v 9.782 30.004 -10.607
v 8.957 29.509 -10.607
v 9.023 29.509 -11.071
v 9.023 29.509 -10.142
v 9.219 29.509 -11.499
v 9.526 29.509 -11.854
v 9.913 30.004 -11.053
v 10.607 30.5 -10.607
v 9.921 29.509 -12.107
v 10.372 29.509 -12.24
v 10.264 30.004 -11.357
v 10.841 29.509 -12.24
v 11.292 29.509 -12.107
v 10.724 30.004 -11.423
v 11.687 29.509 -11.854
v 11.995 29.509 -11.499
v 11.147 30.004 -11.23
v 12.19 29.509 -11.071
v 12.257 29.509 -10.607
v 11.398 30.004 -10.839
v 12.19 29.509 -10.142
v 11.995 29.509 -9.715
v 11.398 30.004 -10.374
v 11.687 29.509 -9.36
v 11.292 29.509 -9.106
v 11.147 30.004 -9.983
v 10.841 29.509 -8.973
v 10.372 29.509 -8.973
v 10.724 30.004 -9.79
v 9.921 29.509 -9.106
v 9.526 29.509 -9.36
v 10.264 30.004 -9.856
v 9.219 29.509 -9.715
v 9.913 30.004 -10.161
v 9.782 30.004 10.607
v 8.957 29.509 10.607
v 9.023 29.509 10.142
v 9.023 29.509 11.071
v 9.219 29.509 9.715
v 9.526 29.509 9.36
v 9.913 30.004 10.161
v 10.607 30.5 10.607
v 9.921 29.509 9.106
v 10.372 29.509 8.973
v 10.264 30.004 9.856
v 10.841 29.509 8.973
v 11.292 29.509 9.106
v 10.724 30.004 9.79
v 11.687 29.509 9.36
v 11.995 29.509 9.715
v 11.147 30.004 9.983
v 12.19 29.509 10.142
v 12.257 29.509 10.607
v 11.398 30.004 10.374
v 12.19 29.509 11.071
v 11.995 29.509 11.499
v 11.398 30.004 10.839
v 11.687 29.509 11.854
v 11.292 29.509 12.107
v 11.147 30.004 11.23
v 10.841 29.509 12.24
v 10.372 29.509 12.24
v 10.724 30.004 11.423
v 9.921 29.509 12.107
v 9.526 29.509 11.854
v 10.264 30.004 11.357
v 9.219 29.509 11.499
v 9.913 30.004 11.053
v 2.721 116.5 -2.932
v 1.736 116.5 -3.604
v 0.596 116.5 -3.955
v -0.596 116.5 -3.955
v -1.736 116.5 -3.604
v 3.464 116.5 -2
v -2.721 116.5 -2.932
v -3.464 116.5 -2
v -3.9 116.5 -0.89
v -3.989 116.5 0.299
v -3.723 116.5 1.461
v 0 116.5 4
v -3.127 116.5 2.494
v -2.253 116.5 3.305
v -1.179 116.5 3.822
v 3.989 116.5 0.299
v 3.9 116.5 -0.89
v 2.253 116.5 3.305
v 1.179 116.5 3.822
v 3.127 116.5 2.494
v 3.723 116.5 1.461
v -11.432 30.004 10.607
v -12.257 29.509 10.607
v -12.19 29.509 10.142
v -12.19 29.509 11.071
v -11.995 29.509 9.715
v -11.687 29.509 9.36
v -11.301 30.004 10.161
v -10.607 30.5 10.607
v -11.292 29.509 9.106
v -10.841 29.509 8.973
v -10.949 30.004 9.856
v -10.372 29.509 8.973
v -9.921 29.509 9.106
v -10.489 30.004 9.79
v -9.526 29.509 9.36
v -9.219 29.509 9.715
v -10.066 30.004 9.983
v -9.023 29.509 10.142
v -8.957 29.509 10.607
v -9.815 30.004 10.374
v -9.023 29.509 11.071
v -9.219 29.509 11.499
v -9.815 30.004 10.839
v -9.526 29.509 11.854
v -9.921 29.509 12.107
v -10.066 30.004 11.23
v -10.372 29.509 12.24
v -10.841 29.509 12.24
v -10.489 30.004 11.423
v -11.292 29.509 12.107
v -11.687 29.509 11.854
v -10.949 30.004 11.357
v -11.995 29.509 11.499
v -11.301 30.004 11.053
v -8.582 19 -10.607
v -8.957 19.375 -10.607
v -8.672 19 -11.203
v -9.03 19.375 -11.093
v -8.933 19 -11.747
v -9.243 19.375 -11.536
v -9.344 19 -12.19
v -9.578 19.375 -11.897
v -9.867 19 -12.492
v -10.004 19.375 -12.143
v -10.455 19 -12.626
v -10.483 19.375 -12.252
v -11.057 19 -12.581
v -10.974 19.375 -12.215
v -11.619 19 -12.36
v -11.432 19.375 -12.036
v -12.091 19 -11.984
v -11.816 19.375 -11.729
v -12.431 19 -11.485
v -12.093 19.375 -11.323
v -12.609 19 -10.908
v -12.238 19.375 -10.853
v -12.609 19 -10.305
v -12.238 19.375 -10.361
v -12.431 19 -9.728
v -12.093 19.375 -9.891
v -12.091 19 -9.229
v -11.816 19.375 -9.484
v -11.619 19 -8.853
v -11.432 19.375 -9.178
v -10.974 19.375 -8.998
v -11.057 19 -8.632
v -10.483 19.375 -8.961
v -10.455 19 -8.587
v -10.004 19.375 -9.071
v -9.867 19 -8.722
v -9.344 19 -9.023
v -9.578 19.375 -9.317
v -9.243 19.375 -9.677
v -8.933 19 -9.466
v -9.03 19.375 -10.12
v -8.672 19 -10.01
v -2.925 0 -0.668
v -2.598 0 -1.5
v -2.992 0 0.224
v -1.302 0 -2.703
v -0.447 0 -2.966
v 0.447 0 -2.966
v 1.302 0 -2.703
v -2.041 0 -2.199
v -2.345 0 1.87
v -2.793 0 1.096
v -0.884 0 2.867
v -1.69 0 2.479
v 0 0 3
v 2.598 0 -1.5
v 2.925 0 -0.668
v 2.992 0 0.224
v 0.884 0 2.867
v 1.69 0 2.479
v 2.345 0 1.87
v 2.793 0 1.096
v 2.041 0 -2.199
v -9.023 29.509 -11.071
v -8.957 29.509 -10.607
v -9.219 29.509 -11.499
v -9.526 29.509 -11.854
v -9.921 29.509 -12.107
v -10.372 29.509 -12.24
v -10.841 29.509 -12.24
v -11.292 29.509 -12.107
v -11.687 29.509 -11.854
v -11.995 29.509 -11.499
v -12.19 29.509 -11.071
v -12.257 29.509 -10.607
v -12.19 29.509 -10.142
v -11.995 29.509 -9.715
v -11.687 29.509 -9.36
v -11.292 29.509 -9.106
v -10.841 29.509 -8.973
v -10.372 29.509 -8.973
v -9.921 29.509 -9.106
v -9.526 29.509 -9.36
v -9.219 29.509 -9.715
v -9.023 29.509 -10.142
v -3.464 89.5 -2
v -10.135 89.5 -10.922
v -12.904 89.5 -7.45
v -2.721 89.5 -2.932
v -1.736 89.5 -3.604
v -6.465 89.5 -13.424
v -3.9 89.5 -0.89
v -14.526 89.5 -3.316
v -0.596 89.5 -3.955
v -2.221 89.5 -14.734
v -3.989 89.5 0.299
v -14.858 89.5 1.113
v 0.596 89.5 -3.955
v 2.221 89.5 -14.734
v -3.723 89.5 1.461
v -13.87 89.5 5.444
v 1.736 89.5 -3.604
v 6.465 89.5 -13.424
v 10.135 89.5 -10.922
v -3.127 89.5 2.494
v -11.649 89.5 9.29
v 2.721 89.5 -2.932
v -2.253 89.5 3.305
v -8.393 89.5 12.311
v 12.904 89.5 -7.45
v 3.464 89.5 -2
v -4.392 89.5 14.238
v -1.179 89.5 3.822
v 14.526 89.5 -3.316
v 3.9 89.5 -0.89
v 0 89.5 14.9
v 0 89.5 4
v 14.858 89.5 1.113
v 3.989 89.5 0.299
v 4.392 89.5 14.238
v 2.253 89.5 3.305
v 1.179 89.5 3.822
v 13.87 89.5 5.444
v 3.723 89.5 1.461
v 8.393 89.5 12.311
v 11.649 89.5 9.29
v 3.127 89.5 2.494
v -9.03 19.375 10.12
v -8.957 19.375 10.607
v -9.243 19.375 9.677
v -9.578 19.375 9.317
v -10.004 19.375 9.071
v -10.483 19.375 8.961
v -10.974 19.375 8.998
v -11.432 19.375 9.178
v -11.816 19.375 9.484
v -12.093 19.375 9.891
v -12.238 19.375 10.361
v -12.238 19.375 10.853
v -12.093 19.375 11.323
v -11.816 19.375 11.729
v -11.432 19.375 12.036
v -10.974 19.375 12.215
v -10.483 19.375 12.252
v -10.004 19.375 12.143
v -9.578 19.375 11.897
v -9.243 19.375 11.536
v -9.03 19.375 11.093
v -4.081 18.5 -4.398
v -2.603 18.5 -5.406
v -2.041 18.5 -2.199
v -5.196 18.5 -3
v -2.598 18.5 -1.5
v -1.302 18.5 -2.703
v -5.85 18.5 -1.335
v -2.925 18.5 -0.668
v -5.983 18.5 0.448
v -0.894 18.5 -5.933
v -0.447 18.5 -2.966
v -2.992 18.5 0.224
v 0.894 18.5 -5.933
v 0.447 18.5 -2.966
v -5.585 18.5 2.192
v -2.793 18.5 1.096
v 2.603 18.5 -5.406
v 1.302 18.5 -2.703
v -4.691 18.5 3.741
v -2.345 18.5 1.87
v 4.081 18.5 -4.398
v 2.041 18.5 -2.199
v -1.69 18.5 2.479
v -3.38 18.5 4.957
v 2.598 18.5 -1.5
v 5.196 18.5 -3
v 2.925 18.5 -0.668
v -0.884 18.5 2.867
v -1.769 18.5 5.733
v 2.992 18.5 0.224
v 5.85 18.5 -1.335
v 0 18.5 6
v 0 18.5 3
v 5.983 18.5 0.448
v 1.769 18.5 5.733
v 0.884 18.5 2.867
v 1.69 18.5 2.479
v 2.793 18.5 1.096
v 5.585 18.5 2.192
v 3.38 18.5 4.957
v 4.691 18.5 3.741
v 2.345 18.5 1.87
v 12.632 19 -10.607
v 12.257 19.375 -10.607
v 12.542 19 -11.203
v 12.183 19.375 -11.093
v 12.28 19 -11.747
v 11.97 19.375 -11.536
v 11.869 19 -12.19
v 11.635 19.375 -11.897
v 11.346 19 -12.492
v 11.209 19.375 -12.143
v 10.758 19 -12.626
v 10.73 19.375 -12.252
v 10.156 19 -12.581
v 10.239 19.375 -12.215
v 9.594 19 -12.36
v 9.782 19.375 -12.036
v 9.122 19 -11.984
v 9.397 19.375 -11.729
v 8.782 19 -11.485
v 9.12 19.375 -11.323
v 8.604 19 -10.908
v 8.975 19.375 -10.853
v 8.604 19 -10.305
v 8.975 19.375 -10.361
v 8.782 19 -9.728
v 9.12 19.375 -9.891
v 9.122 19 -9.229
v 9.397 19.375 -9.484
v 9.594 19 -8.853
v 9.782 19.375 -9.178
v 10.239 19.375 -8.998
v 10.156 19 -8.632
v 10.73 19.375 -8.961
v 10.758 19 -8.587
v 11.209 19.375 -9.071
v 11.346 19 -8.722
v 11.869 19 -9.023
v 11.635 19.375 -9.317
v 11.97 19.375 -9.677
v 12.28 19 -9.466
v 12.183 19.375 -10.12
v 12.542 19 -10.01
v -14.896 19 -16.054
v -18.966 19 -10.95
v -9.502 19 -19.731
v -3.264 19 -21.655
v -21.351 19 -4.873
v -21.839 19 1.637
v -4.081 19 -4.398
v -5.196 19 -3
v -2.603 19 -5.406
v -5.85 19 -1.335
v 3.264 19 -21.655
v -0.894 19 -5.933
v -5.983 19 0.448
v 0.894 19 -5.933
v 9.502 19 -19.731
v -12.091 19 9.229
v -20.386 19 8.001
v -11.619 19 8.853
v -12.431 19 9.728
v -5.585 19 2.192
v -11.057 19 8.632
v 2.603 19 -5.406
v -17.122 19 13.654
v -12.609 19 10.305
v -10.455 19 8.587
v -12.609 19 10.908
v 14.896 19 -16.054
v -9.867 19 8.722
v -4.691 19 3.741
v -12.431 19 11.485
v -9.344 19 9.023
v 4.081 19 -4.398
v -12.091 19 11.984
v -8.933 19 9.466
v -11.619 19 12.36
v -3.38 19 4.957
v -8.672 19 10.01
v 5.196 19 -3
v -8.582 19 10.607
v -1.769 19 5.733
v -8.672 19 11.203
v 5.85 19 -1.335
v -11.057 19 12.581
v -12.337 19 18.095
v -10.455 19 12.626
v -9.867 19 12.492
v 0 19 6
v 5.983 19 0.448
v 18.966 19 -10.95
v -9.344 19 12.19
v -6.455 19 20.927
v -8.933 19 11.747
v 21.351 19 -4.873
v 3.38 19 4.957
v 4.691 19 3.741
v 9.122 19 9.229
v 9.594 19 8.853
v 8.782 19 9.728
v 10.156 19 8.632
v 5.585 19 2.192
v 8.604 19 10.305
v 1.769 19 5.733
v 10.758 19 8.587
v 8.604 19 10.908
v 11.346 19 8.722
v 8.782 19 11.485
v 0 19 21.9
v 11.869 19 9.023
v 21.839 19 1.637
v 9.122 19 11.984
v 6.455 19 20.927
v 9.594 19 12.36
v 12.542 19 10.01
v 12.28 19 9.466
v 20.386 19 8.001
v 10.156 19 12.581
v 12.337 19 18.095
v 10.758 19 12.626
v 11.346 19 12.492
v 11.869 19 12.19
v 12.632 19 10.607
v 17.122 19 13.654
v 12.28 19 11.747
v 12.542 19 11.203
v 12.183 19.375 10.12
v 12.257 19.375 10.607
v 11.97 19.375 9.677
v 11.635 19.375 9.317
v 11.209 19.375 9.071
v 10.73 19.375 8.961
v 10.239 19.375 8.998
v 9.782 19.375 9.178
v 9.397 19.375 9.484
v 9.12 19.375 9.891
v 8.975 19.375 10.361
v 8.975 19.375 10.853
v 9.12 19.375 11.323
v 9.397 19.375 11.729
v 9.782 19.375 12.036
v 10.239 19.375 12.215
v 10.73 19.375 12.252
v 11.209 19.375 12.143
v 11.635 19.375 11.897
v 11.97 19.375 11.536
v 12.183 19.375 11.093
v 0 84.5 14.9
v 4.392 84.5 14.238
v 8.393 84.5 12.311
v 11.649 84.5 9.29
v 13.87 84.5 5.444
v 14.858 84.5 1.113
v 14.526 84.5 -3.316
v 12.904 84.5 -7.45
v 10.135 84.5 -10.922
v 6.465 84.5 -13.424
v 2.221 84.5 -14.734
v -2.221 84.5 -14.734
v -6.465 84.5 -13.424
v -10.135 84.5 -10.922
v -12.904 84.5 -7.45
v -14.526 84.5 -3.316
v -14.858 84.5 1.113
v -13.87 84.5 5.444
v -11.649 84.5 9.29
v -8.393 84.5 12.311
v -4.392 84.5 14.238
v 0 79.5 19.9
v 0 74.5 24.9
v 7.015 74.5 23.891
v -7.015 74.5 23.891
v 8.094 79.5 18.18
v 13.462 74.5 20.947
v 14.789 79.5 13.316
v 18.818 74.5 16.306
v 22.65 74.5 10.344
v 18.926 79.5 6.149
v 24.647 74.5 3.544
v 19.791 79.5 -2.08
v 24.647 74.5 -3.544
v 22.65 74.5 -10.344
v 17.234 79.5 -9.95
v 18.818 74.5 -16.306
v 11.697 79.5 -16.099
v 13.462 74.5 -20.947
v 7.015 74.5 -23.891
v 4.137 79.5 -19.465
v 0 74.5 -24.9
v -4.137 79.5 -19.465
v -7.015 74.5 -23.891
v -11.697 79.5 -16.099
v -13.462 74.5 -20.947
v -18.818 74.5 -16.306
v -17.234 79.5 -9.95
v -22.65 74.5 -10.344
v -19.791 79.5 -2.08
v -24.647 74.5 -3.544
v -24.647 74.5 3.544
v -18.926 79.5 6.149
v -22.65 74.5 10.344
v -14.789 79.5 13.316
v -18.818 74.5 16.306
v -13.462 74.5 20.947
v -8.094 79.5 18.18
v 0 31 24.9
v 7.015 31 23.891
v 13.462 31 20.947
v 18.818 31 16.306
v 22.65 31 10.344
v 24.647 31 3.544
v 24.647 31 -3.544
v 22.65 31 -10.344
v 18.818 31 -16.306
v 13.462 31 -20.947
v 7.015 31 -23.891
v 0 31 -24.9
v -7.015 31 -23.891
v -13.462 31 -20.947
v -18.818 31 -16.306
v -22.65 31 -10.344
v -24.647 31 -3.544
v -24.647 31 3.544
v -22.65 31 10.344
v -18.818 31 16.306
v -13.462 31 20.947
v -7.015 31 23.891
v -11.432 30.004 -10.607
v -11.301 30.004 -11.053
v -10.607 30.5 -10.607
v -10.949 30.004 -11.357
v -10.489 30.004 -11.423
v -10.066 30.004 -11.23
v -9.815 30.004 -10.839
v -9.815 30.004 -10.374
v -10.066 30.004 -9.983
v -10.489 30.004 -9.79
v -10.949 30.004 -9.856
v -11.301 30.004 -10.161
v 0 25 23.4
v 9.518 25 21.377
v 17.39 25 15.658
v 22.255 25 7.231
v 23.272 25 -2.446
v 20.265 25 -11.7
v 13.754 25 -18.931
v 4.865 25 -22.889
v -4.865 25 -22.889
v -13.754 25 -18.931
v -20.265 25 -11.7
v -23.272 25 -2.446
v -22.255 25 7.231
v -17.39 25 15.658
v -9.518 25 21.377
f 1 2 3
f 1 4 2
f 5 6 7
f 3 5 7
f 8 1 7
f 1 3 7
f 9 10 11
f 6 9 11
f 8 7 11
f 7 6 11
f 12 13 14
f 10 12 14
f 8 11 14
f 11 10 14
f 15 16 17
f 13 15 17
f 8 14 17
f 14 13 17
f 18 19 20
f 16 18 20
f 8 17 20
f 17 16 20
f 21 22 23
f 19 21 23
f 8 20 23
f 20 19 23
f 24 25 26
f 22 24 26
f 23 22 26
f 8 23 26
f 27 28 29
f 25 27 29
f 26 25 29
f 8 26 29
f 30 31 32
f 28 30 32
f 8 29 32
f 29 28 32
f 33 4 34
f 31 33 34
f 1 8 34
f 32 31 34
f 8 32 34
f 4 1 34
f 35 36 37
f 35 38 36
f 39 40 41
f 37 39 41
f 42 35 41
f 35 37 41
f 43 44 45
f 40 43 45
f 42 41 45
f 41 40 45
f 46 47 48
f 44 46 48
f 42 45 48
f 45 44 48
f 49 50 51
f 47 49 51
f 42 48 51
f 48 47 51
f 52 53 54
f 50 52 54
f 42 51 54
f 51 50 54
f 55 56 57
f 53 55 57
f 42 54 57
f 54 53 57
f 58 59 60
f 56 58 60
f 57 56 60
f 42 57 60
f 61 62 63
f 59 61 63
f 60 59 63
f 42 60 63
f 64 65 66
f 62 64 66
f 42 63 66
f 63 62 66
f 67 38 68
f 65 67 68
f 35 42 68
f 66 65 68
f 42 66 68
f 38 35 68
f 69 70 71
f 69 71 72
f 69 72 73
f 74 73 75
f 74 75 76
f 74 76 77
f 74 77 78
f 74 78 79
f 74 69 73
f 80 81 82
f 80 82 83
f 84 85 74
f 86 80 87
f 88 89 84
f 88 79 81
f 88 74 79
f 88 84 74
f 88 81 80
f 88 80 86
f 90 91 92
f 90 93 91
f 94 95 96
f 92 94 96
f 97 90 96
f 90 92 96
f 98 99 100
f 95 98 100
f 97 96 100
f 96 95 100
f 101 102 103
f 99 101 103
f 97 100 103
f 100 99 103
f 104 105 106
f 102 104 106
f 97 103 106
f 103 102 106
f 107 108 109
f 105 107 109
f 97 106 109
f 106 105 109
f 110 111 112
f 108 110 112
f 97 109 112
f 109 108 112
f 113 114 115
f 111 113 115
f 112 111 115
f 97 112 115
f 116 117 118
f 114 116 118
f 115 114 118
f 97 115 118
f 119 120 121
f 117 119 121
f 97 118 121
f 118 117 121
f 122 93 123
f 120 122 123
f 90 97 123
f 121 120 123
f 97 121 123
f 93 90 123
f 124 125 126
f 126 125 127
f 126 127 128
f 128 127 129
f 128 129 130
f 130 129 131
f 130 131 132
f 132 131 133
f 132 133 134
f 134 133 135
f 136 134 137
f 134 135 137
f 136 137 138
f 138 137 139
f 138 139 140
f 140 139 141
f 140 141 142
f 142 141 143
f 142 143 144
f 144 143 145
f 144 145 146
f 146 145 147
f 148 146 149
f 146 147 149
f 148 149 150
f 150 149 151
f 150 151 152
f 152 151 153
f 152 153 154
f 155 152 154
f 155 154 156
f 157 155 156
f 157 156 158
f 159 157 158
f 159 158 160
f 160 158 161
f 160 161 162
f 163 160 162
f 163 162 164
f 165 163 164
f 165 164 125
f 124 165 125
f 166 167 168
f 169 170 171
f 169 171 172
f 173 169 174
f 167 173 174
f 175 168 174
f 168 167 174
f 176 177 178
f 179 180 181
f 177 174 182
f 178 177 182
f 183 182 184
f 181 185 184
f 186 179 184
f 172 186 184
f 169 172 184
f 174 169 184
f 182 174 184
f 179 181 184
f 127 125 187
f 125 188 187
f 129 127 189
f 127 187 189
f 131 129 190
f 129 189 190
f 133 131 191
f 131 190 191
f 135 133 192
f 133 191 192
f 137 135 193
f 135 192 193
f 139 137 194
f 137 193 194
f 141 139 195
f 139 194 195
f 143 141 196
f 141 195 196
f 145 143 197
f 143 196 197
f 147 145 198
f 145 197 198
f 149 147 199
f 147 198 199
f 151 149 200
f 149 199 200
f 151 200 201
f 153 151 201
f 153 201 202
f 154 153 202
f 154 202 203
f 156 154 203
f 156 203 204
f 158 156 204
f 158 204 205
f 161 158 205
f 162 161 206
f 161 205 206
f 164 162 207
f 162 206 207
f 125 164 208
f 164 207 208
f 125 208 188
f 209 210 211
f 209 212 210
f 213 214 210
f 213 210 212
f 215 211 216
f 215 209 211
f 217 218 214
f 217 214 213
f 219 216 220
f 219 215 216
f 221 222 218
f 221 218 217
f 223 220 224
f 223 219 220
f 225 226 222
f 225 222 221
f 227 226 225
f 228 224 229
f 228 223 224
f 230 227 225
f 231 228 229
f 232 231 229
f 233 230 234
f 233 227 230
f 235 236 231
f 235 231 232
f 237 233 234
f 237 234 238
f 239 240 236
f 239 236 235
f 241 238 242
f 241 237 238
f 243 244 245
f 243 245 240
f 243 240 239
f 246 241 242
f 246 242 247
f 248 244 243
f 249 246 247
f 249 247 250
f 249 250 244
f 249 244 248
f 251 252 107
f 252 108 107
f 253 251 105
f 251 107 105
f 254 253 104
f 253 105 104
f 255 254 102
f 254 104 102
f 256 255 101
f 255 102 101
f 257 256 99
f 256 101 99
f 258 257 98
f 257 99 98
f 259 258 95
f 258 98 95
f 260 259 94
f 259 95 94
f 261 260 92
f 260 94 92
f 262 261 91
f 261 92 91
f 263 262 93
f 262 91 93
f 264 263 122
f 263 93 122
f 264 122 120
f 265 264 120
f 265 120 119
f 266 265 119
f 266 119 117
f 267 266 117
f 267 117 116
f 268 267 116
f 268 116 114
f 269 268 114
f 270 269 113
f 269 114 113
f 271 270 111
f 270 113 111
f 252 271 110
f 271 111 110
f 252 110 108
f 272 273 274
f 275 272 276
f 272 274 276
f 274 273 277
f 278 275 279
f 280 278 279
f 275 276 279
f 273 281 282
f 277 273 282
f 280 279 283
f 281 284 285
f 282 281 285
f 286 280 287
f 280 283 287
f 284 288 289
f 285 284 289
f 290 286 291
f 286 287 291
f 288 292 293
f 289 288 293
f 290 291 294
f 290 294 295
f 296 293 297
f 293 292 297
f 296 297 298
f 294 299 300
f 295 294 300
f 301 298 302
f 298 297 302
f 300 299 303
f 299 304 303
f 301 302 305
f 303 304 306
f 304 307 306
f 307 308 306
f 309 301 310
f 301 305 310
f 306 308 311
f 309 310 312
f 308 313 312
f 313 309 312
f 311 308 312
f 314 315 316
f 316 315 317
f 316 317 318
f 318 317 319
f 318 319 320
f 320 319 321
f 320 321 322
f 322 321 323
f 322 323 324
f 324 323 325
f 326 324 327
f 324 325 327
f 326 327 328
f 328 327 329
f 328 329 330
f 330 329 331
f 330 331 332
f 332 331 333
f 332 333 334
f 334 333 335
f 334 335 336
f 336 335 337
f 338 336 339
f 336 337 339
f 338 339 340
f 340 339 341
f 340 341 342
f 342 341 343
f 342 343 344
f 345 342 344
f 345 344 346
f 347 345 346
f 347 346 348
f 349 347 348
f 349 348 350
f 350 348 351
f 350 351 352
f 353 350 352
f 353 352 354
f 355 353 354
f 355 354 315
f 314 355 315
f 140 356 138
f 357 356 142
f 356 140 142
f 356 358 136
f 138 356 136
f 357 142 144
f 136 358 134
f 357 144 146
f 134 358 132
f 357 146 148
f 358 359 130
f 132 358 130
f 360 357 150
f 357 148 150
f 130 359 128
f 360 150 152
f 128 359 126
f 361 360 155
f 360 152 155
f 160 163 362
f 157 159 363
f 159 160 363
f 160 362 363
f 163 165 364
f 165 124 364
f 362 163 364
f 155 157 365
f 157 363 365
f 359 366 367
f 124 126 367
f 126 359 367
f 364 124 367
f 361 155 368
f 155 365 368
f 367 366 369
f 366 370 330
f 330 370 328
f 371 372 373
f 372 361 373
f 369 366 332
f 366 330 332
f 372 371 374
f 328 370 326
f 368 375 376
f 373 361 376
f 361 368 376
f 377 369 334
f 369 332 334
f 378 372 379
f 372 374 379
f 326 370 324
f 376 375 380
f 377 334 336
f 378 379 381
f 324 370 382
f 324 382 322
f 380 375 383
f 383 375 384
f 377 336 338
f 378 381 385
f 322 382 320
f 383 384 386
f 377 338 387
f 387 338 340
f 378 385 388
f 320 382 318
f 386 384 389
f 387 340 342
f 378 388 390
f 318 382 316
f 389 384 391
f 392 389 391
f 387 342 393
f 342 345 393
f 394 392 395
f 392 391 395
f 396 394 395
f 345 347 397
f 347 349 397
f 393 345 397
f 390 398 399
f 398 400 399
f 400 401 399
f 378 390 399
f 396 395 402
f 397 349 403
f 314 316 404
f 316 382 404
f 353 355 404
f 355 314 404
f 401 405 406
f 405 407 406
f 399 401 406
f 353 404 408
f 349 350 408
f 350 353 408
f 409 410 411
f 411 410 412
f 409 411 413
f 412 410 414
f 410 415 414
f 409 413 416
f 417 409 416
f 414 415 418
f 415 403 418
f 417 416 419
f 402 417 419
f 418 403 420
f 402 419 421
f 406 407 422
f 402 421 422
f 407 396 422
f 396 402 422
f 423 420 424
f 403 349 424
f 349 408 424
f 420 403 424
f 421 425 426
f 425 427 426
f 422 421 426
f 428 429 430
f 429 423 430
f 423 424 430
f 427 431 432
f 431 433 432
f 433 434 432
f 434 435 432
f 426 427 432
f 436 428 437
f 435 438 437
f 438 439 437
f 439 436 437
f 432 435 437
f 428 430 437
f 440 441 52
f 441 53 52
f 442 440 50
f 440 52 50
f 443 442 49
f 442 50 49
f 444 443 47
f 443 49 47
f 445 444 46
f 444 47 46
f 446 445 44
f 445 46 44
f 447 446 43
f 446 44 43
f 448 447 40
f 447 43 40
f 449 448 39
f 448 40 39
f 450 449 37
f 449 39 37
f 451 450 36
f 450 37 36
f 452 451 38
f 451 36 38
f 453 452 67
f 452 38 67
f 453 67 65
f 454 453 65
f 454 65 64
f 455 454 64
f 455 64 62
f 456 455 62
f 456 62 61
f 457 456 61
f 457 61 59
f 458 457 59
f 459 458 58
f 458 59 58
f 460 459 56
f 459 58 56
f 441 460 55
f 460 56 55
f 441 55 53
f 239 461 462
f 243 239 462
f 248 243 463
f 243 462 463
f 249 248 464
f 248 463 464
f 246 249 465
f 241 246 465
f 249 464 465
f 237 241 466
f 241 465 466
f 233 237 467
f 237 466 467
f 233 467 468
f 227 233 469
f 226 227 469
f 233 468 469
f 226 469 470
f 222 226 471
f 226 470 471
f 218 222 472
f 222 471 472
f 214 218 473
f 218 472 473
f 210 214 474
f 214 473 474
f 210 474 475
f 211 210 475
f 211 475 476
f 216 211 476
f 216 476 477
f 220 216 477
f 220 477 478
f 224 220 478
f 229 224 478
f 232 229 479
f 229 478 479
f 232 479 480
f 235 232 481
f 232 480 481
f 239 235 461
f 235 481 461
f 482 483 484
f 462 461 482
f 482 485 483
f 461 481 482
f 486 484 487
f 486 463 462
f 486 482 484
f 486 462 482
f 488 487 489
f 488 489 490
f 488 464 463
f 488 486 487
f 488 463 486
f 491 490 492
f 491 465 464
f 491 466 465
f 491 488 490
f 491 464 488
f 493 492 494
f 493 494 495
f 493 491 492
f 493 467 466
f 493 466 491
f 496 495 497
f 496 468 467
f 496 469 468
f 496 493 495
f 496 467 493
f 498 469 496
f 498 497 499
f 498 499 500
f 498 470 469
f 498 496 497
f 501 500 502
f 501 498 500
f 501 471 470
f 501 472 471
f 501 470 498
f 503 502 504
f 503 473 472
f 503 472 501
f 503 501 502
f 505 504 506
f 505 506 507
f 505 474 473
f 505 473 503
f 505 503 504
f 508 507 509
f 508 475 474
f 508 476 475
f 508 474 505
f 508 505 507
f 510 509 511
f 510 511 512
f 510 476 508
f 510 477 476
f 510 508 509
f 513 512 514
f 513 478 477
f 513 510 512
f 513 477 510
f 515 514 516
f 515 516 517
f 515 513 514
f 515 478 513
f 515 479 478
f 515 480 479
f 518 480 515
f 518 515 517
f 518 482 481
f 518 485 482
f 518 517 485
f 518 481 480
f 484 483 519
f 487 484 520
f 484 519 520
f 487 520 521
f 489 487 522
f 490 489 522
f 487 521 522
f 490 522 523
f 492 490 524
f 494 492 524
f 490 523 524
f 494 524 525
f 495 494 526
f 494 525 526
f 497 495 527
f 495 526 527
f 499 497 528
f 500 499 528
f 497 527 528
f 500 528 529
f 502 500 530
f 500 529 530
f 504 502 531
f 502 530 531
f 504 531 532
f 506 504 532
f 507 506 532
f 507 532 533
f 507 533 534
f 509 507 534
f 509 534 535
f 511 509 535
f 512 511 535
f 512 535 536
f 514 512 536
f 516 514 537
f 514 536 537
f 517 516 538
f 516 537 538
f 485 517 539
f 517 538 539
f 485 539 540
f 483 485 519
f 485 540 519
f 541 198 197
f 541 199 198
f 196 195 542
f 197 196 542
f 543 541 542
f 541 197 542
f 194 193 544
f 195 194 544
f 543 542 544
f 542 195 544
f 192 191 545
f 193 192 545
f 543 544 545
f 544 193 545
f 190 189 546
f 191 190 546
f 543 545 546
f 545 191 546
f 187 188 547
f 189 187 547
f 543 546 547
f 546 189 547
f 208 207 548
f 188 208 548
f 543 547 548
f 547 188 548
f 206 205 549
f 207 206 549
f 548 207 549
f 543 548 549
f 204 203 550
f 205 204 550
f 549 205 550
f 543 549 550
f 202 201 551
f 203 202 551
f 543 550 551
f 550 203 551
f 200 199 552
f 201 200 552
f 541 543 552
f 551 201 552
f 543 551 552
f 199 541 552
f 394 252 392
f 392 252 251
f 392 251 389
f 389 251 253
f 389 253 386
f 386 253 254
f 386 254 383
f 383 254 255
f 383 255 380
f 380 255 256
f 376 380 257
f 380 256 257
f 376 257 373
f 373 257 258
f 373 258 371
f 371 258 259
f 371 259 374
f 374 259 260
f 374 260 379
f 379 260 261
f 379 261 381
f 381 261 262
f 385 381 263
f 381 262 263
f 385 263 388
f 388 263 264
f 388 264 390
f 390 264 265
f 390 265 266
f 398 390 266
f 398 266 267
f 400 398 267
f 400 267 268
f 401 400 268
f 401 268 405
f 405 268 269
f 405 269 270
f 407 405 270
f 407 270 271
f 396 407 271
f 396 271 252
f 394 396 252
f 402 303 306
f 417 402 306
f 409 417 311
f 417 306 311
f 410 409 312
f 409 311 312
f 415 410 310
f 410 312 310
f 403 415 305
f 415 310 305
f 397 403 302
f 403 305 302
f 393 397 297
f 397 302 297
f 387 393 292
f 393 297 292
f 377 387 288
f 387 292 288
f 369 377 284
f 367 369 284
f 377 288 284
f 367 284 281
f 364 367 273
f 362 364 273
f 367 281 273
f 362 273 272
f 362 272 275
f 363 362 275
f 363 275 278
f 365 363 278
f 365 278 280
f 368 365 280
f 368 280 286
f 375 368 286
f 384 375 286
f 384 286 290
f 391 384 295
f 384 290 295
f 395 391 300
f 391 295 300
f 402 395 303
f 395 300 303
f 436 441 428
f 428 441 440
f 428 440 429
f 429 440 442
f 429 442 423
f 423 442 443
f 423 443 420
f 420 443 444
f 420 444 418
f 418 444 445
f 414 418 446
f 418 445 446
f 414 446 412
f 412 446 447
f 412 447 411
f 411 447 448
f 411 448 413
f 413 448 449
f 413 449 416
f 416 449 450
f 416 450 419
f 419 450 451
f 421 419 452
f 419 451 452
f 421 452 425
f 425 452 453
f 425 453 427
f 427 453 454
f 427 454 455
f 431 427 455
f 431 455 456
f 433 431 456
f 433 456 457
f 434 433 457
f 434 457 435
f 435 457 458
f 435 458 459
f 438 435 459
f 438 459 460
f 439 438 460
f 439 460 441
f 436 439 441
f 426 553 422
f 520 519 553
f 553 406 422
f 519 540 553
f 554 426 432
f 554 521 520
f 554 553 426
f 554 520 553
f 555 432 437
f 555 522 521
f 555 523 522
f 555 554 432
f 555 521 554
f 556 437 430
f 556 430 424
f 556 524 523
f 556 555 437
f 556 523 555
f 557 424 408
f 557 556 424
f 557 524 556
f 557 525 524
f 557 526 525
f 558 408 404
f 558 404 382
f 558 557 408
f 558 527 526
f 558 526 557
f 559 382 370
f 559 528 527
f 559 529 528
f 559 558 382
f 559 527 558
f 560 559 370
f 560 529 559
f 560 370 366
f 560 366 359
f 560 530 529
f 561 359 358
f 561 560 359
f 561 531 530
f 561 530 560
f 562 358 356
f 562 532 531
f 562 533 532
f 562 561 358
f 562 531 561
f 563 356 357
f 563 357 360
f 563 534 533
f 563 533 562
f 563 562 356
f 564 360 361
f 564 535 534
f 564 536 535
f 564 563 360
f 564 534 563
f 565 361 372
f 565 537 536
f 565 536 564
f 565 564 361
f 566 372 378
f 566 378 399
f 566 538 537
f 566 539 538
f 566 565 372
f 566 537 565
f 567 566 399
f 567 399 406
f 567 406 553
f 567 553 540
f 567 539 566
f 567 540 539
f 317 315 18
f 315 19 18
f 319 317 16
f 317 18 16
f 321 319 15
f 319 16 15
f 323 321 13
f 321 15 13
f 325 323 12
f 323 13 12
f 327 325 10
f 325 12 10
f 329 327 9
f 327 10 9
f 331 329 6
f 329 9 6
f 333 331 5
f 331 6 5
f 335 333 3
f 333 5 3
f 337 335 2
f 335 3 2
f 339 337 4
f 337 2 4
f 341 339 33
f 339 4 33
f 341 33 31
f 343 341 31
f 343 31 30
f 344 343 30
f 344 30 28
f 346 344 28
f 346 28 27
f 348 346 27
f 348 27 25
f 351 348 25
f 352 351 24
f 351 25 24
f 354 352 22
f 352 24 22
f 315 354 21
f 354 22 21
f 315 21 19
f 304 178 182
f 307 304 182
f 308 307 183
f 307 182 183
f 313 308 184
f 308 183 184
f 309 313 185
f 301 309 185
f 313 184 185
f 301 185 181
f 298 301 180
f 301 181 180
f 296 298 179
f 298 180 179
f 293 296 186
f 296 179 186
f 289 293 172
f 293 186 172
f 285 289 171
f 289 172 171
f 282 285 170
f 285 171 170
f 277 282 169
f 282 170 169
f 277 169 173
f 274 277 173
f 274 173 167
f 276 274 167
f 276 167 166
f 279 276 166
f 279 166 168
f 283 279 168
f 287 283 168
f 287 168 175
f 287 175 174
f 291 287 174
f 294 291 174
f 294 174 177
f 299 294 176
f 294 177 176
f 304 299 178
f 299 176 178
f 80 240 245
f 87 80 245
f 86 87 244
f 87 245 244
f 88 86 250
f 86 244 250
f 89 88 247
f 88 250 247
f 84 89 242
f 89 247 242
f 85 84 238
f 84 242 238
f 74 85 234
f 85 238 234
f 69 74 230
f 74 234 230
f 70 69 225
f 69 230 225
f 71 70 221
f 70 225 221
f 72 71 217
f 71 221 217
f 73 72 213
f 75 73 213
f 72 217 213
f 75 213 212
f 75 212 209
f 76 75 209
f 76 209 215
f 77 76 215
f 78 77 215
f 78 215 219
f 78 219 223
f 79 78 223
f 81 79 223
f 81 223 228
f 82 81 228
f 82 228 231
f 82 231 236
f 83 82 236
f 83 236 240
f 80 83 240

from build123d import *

# Parameters (mm, degrees)
SKETCH2_R                       = 3
BOSS_EXTRUDE3_DEPTH             = 18.5
SKETCH3_R                       = 6
BOSS_EXTRUDE5_DEPTH             = 0.5
SKETCH5_R                       = 24.9
BOSS_EXTRUDE6_DEPTH             = 65.5
SKETCH6_R                       = 4
BOSS_EXTRUDE7_DEPTH             = 32
CHAMFER1_SIZE                   = 3
CHAMFER1_SIZE2                  = 12
CHAMFER2_SIZE                   = 10
SKETCH7_R                       = 14.9
BOSS_EXTRUDE8_DEPTH             = 5
M4X0_7_TAPPED_HOLE1_D           = 3.3
M4X0_7_TAPPED_HOLE1_DEPTH       = 10.508579979
M4X0_7_TAPPED_HOLE1_CSINK_D     = 4.05
M4X0_7_TAPPED_HOLE1_CSINK_ANGLE = 90
M4X0_7_TAPPED_HOLE1_TIP         = 0.991420021


with BuildPart() as part:
    # Sketch2 → Boss-Extrude3 (new body)
    with BuildSketch(Plane(origin=(0, 0, 0), x_dir=(1, 0, 0), z_dir=(0, 1, 0))):
        with Locations(Location((0, 0, 0), (0, 0, 270))):
            Circle(SKETCH2_R)
    extrude(amount=BOSS_EXTRUDE3_DEPTH)

    # Sketch3 → Boss-Extrude5 (add)
    with BuildSketch(Plane(origin=(0, 18.5, 0), x_dir=(1, 0, 0), z_dir=(0, 1, 0))):
        with Locations(Location((0, 0, 0), (0, 0, 270))):
            Circle(SKETCH3_R)
    extrude(amount=BOSS_EXTRUDE5_DEPTH)

    # Sketch5 → Boss-Extrude6 (add)
    with BuildSketch(Plane(origin=(0, 19, 0), x_dir=(1, 0, 0), z_dir=(0, 1, 0))):
        with Locations(Location((0, 0, 0), (0, 0, 270))):
            Circle(SKETCH5_R)
    extrude(amount=BOSS_EXTRUDE6_DEPTH)

    # Sketch6 → Boss-Extrude7 (add)
    with BuildSketch(Plane(origin=(0, 84.5, 0), x_dir=(1, 0, 0), z_dir=(0, 1, 0))):
        with Locations(Location((0, 0, 0), (0, 0, 270))):
            Circle(SKETCH6_R)
    extrude(amount=BOSS_EXTRUDE7_DEPTH)

    # Chamfer1
    chamfer1_edges = [part.edges().sort_by_distance(p)[0] for p in [
        (0, 19, -24.9),
    ]]
    chamfer1_side = [part.faces().sort_by_distance(p)[0] for p in [
        (0, 19, -24.195721646),
    ]]
    chamfer(chamfer1_edges, length=CHAMFER1_SIZE, length2=CHAMFER1_SIZE2, reference=chamfer1_side[0])

    # Chamfer2
    chamfer2_edges = [part.edges().sort_by_distance(p)[0] for p in [
        (0, 84.5, -24.9),
    ]]
    chamfer(chamfer2_edges, length=CHAMFER2_SIZE)

    # Sketch7 → Boss-Extrude8 (add)
    with BuildSketch(Plane(origin=(0, 84.5, 0), x_dir=(1, 0, 0), z_dir=(0, 1, 0))):
        with Locations(Location((0, 0, 0), (0, 0, 270))):
            Circle(SKETCH7_R)
    extrude(amount=BOSS_EXTRUDE8_DEPTH)

    # M4x0.7 Tapped Hole1
    with Locations(Plane(origin=(0, 19, 0), x_dir=(-1, 0, 0), z_dir=(0, -1, 0))):
        with Locations((-10.606601718, 10.606601718), (10.606601718, -10.606601718), (10.606601718, 10.606601718), (-10.606601718, -10.606601718)):
            CounterSinkHole(M4X0_7_TAPPED_HOLE1_D / 2, M4X0_7_TAPPED_HOLE1_CSINK_D / 2, depth=M4X0_7_TAPPED_HOLE1_DEPTH, counter_sink_angle=M4X0_7_TAPPED_HOLE1_CSINK_ANGLE)
            with Locations((0, 0, -(M4X0_7_TAPPED_HOLE1_DEPTH + M4X0_7_TAPPED_HOLE1_TIP / 2))):  # 118° drill point
                Cone(0, M4X0_7_TAPPED_HOLE1_D / 2, M4X0_7_TAPPED_HOLE1_TIP, mode=Mode.SUBTRACT)


solid = part.part
